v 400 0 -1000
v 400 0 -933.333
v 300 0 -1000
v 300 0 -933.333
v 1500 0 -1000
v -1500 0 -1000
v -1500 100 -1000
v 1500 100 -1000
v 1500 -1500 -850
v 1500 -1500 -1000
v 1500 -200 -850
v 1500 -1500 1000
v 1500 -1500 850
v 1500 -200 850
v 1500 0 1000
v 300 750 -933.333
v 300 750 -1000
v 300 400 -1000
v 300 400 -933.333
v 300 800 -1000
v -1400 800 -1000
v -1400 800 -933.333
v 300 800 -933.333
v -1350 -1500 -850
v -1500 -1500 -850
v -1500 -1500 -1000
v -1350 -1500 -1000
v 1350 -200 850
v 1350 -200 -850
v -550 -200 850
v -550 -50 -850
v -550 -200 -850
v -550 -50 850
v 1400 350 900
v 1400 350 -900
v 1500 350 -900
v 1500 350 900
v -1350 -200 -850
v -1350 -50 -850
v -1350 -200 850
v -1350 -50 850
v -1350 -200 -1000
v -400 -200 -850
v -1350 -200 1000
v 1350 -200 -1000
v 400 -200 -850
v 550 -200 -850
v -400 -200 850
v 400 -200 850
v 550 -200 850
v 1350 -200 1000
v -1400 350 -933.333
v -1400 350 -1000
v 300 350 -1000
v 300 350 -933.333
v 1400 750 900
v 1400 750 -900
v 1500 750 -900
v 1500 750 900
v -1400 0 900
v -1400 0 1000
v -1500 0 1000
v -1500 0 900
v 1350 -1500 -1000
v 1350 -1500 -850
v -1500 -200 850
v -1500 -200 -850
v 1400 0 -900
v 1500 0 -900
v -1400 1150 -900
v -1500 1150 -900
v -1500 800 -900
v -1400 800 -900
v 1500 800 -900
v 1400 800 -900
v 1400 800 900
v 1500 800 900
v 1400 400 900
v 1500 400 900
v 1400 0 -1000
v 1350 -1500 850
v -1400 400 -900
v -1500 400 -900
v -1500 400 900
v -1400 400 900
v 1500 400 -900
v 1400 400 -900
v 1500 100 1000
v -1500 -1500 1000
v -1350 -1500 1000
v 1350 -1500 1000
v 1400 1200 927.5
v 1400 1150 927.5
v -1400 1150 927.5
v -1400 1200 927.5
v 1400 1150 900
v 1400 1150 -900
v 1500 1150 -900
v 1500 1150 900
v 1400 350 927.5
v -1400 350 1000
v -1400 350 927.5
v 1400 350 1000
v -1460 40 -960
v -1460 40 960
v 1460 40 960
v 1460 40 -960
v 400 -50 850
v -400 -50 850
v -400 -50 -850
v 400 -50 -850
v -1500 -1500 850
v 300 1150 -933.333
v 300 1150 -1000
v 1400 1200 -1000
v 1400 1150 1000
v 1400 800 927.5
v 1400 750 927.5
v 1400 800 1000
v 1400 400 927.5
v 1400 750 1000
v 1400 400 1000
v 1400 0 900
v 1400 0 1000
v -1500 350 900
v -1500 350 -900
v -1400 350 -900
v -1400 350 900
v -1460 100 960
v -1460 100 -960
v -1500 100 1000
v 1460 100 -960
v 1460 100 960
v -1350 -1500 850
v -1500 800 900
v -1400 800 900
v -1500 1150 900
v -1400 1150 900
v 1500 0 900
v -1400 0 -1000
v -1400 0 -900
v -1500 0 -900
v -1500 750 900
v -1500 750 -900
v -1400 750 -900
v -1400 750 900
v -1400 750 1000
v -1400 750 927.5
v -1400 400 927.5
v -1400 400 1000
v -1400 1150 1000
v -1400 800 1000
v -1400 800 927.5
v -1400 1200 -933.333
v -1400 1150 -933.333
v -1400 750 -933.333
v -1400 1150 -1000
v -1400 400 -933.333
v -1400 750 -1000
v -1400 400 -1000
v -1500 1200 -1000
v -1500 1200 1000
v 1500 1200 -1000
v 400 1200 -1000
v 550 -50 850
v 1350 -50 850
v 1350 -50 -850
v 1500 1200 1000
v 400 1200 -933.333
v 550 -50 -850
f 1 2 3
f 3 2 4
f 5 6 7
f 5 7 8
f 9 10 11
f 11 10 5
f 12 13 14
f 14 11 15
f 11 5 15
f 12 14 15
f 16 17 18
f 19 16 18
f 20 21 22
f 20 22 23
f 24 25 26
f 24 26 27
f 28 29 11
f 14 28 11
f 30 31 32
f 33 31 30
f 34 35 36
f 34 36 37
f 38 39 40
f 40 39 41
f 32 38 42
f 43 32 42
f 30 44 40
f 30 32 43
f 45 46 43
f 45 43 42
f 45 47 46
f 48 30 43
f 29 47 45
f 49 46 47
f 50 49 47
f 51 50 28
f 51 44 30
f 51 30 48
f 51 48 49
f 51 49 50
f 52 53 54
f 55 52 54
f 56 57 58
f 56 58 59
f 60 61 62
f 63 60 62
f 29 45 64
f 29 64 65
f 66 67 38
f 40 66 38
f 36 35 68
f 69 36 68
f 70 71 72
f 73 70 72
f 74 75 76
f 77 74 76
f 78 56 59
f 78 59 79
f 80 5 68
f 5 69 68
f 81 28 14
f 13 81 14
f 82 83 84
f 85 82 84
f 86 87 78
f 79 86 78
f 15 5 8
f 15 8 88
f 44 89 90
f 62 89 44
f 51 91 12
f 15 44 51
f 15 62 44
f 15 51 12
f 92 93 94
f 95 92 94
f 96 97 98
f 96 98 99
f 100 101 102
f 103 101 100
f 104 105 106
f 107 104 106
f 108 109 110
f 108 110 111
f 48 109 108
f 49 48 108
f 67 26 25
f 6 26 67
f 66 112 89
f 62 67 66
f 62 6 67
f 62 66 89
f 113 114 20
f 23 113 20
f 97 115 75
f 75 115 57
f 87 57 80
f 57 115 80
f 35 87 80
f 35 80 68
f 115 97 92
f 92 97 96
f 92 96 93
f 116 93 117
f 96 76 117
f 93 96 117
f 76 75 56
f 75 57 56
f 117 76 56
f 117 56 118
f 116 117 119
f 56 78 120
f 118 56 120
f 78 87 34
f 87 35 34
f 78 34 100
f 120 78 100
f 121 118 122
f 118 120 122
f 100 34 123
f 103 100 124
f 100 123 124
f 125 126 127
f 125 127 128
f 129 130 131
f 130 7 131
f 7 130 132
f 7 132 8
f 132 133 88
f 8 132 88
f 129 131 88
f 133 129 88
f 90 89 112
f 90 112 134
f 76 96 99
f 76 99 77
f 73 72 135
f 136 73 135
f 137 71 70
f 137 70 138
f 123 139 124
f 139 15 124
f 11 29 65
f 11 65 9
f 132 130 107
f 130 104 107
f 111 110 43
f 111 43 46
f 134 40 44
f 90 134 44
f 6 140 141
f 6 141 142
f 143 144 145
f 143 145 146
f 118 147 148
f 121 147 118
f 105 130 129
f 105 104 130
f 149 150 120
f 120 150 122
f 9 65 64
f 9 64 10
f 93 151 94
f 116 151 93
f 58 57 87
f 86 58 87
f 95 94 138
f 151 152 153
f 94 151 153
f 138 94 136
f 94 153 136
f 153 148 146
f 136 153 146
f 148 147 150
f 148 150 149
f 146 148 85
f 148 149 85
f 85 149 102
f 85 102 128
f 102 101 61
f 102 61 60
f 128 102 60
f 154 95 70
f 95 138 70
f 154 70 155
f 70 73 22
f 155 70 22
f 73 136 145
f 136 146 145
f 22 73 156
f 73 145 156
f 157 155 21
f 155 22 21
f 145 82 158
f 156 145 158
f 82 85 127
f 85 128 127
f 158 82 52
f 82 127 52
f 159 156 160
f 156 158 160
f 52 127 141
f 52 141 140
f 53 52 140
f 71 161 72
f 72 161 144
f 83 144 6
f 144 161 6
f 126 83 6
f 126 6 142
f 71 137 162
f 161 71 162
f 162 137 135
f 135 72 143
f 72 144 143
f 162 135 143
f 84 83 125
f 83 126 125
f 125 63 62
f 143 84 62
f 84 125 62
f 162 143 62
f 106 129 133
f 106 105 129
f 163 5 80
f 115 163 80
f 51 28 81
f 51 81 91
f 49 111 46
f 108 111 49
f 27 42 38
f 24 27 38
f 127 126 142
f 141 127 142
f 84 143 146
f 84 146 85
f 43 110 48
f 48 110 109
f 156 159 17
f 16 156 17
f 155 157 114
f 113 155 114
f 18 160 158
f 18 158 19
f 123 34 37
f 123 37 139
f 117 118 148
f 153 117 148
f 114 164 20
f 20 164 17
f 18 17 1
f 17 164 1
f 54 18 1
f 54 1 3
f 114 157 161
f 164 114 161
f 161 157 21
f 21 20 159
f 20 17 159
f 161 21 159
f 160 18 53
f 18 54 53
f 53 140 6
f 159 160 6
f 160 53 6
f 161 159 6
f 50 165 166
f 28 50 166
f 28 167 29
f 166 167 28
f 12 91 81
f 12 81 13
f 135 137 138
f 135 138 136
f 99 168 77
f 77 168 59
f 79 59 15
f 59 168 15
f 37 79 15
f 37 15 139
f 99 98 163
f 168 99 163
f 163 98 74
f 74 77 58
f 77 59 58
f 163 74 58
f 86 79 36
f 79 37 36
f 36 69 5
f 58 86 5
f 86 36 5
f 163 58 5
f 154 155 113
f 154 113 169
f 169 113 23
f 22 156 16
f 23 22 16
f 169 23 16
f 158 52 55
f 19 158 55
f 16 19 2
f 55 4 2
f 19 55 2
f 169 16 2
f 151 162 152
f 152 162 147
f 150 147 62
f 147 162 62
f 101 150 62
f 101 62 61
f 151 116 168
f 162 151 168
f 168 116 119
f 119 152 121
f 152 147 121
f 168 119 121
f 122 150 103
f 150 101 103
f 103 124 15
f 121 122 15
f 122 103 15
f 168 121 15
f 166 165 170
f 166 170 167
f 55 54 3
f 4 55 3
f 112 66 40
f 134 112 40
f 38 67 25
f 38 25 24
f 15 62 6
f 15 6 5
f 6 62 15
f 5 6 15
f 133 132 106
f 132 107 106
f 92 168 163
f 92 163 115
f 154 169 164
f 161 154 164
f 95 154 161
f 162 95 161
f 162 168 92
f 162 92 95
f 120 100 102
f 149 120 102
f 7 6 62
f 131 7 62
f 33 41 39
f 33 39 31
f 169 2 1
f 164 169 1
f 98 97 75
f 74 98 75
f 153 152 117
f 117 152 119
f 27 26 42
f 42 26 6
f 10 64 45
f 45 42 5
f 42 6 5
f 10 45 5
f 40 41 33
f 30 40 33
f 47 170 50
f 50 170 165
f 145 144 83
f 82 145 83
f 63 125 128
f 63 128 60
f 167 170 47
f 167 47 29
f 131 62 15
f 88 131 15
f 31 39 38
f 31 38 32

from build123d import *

# Parameters (mm, degrees)
F0_W      = 3000
F0_H      = 2000
F1_DEPTH  = 50
F2_W      = 150
F2_H      = 150
F3_DEPTH  = 1450
F5_DEPTH  = 1200
F6_W      = 350
F6_H      = 1800
F7_DEPTH  = 3000.001
F8_W      = 1700
F8_H      = 350
F9_DEPTH  = 110
F10_W     = 2800
F10_H     = 350
F11_DEPTH = 110
F12_DEPTH = 100
F13_W     = 150
F13_H     = 1700
F13_W_2   = 2700
F13_H_2   = 150
F14_DEPTH = 150
F15_W     = 150
F15_H     = 1700
F16_DEPTH = 150
F17_T     = -40


with BuildPart() as f1:
    # F0 (on Front) → F1 (new body)
    with BuildSketch(Plane.XZ):
        Rectangle(F0_W, F0_H)
    extrude(amount=F1_DEPTH)

    # F2 (on face) → F3 (join)
    with BuildSketch(Plane.XZ.offset(50)):
        with Locations((-1425, 925)):
            Rectangle(F2_W, F2_H)
        with Locations((1425, 925)):
            Rectangle(F2_W, F2_H)
        with Locations((-1425, -925)):
            Rectangle(F2_W, F2_H)
        with Locations((1425, -925)):
            Rectangle(F2_W, F2_H)
    extrude(amount=F3_DEPTH)


with BuildPart() as f5:
    # F4 (on face) → F5 (new body)
    with BuildSketch(Plane(origin=(0, 0, 0), x_dir=(-1, 0, 0), z_dir=(0, 1, 0))):
        Polygon((-1400, -1000), (-1400, 927.5000095367), (1400, 927.5000095367), (1400, -933.333337307), (-400, -933.333337307), (-400, -1000), (1500, -1000), (1500, 1000), (-1500, 1000), (-1500, -1000), align=None)
    extrude(amount=F5_DEPTH)

    # F6 (on face) → F7 (cut, through all)
    with BuildSketch(Plane(origin=(-1500, 0, 0), x_dir=(0, -1, 0), z_dir=(-1, 0, 0))):
        with Locations((-975, 0)):
            Rectangle(F6_W, F6_H)
        with Locations((-575, 0)):
            Rectangle(F6_W, F6_H)
        with Locations((-175, 0)):
            Rectangle(F6_W, F6_H)
    extrude(amount=-F7_DEPTH, mode=Mode.SUBTRACT)

    # F8 (on face) → F9 (cut)
    with BuildSketch(Plane(origin=(0, 0, -1000), x_dir=(1, 0, 0), z_dir=(0, 0, -1))):
        with Locations((-550, -975)):
            Rectangle(F8_W, F8_H)
        with Locations((-550, -175)):
            Rectangle(F8_W, F8_H)
        with Locations((-550, -575)):
            Rectangle(F8_W, F8_H)
    extrude(amount=-F9_DEPTH, mode=Mode.SUBTRACT)

    # F10 (on face) → F11 (cut)
    with BuildSketch(Plane.XY.offset(1000)):
        with Locations((0, 975)):
            Rectangle(F10_W, F10_H)
        with Locations((0, 575)):
            Rectangle(F10_W, F10_H)
        with Locations((0, 175)):
            Rectangle(F10_W, F10_H)
    extrude(amount=-F11_DEPTH, mode=Mode.SUBTRACT)


with BuildPart() as f12:
    # F12 (new): a face of the model
    f12_faces = [f1.part.faces().sort_by_distance(p)[0] for p in [
        (0, 0, 0),
    ]]
    extrude(f12_faces, amount=F12_DEPTH)

    # F17
    f17_openings = [f12.faces().sort_by_distance(p)[0] for p in [
        (0, 100, 0),
    ]]
    offset(amount=F17_T, openings=f17_openings)


with BuildPart() as f1_1:
    add(f1.part)

    # F13 (on face) → F14 (join)
    with BuildSketch(Plane.XZ.offset(50)):
        with Locations((-1425, 0)):
            Rectangle(F13_W, F13_H)
        with Locations((0, 925)):
            Rectangle(F13_W_2, F13_H_2)
        with Locations((1425, 0)):
            Rectangle(F13_W, F13_H)
        with Locations((0, -925)):
            Rectangle(F13_W_2, F13_H_2)
    extrude(amount=F14_DEPTH)

    # F15 (on face) → F16 (join)
    with BuildSketch(Plane.XZ.offset(50)):
        with Locations((-475, 0)):
            Rectangle(F15_W, F15_H)
        with Locations((475, 0)):
            Rectangle(F15_W, F15_H)
    extrude(amount=F16_DEPTH)


solid = Compound([f5.part, f12.part, f1_1.part])
